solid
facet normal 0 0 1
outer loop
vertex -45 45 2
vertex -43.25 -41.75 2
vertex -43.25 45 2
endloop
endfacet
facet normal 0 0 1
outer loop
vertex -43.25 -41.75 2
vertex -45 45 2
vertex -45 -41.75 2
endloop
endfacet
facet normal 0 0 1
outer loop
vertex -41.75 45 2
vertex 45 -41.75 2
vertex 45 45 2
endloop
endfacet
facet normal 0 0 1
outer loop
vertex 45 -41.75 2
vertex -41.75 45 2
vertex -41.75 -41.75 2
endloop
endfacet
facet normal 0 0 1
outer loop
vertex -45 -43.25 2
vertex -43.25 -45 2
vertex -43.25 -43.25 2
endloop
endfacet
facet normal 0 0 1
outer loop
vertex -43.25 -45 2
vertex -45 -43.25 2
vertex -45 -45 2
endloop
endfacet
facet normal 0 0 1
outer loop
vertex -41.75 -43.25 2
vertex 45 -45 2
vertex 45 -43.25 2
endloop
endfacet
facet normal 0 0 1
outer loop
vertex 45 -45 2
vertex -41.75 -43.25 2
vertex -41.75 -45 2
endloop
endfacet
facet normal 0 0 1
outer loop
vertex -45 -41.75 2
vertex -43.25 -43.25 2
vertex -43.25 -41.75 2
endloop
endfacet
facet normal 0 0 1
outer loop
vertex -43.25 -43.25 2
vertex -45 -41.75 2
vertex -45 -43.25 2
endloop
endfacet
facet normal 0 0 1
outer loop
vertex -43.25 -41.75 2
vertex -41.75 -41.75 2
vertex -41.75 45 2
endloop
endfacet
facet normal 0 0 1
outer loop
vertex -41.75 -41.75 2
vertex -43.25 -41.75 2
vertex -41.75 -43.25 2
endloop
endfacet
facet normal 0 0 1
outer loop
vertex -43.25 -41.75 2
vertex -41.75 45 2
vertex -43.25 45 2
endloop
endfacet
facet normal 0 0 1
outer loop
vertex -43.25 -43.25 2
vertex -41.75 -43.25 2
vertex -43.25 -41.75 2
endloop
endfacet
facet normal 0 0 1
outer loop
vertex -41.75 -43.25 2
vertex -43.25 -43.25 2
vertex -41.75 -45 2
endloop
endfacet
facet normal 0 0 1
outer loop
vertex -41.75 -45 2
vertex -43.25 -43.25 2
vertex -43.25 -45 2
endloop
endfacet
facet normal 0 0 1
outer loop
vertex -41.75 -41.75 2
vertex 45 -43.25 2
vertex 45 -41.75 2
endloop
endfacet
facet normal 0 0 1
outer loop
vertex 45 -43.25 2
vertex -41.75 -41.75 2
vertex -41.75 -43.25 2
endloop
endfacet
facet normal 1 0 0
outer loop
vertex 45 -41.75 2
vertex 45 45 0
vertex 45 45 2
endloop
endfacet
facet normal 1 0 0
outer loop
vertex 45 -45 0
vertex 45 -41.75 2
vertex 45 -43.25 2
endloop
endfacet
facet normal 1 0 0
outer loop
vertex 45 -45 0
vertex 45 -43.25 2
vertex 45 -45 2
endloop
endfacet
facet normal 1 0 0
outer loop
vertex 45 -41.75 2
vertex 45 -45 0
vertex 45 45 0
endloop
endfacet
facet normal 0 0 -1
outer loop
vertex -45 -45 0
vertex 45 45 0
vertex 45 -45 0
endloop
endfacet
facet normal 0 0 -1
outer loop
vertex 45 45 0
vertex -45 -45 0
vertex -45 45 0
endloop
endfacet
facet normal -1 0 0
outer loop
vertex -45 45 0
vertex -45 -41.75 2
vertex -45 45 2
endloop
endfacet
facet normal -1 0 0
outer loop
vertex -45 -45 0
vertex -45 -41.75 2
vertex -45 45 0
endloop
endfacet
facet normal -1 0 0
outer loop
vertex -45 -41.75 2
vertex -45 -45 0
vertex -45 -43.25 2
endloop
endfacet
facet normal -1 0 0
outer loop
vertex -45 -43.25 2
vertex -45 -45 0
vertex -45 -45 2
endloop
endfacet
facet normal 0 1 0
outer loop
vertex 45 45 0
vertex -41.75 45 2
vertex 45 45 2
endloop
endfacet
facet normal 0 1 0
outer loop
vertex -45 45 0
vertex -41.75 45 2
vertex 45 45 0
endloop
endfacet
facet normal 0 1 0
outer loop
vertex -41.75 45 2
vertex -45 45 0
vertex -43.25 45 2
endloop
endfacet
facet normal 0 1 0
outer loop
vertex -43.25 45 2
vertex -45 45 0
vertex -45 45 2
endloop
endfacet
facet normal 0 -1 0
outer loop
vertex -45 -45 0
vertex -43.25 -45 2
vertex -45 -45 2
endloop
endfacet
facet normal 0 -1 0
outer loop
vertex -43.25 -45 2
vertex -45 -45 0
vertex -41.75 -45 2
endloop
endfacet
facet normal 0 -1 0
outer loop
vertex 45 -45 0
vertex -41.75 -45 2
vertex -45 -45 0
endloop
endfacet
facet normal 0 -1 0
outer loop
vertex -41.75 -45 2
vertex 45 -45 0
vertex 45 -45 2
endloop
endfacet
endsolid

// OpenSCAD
// Built by bench/smallmodels/features/compiler.py from a list of features.
$fn = 64;
difference() {
  union() {
    translate([0, 0, 0]) translate([-45, -45, 0]) cube([90, 90, 2]);
  }
  union() {
    translate([-42.5, 0, 2]) rotate([0, 0, 0]) translate([-0.75, -45, 0]) cube([1.5, 90, 38]);
    translate([0, -42.5, 2]) rotate([0, 0, 0]) translate([-45, -0.75, 0]) cube([90, 1.5, 38]);
    translate([0, 0, -40]) rotate([0, 0, 0]) translate([-45, -45, 0]) cube([90, 90, 38]);
  }
}
